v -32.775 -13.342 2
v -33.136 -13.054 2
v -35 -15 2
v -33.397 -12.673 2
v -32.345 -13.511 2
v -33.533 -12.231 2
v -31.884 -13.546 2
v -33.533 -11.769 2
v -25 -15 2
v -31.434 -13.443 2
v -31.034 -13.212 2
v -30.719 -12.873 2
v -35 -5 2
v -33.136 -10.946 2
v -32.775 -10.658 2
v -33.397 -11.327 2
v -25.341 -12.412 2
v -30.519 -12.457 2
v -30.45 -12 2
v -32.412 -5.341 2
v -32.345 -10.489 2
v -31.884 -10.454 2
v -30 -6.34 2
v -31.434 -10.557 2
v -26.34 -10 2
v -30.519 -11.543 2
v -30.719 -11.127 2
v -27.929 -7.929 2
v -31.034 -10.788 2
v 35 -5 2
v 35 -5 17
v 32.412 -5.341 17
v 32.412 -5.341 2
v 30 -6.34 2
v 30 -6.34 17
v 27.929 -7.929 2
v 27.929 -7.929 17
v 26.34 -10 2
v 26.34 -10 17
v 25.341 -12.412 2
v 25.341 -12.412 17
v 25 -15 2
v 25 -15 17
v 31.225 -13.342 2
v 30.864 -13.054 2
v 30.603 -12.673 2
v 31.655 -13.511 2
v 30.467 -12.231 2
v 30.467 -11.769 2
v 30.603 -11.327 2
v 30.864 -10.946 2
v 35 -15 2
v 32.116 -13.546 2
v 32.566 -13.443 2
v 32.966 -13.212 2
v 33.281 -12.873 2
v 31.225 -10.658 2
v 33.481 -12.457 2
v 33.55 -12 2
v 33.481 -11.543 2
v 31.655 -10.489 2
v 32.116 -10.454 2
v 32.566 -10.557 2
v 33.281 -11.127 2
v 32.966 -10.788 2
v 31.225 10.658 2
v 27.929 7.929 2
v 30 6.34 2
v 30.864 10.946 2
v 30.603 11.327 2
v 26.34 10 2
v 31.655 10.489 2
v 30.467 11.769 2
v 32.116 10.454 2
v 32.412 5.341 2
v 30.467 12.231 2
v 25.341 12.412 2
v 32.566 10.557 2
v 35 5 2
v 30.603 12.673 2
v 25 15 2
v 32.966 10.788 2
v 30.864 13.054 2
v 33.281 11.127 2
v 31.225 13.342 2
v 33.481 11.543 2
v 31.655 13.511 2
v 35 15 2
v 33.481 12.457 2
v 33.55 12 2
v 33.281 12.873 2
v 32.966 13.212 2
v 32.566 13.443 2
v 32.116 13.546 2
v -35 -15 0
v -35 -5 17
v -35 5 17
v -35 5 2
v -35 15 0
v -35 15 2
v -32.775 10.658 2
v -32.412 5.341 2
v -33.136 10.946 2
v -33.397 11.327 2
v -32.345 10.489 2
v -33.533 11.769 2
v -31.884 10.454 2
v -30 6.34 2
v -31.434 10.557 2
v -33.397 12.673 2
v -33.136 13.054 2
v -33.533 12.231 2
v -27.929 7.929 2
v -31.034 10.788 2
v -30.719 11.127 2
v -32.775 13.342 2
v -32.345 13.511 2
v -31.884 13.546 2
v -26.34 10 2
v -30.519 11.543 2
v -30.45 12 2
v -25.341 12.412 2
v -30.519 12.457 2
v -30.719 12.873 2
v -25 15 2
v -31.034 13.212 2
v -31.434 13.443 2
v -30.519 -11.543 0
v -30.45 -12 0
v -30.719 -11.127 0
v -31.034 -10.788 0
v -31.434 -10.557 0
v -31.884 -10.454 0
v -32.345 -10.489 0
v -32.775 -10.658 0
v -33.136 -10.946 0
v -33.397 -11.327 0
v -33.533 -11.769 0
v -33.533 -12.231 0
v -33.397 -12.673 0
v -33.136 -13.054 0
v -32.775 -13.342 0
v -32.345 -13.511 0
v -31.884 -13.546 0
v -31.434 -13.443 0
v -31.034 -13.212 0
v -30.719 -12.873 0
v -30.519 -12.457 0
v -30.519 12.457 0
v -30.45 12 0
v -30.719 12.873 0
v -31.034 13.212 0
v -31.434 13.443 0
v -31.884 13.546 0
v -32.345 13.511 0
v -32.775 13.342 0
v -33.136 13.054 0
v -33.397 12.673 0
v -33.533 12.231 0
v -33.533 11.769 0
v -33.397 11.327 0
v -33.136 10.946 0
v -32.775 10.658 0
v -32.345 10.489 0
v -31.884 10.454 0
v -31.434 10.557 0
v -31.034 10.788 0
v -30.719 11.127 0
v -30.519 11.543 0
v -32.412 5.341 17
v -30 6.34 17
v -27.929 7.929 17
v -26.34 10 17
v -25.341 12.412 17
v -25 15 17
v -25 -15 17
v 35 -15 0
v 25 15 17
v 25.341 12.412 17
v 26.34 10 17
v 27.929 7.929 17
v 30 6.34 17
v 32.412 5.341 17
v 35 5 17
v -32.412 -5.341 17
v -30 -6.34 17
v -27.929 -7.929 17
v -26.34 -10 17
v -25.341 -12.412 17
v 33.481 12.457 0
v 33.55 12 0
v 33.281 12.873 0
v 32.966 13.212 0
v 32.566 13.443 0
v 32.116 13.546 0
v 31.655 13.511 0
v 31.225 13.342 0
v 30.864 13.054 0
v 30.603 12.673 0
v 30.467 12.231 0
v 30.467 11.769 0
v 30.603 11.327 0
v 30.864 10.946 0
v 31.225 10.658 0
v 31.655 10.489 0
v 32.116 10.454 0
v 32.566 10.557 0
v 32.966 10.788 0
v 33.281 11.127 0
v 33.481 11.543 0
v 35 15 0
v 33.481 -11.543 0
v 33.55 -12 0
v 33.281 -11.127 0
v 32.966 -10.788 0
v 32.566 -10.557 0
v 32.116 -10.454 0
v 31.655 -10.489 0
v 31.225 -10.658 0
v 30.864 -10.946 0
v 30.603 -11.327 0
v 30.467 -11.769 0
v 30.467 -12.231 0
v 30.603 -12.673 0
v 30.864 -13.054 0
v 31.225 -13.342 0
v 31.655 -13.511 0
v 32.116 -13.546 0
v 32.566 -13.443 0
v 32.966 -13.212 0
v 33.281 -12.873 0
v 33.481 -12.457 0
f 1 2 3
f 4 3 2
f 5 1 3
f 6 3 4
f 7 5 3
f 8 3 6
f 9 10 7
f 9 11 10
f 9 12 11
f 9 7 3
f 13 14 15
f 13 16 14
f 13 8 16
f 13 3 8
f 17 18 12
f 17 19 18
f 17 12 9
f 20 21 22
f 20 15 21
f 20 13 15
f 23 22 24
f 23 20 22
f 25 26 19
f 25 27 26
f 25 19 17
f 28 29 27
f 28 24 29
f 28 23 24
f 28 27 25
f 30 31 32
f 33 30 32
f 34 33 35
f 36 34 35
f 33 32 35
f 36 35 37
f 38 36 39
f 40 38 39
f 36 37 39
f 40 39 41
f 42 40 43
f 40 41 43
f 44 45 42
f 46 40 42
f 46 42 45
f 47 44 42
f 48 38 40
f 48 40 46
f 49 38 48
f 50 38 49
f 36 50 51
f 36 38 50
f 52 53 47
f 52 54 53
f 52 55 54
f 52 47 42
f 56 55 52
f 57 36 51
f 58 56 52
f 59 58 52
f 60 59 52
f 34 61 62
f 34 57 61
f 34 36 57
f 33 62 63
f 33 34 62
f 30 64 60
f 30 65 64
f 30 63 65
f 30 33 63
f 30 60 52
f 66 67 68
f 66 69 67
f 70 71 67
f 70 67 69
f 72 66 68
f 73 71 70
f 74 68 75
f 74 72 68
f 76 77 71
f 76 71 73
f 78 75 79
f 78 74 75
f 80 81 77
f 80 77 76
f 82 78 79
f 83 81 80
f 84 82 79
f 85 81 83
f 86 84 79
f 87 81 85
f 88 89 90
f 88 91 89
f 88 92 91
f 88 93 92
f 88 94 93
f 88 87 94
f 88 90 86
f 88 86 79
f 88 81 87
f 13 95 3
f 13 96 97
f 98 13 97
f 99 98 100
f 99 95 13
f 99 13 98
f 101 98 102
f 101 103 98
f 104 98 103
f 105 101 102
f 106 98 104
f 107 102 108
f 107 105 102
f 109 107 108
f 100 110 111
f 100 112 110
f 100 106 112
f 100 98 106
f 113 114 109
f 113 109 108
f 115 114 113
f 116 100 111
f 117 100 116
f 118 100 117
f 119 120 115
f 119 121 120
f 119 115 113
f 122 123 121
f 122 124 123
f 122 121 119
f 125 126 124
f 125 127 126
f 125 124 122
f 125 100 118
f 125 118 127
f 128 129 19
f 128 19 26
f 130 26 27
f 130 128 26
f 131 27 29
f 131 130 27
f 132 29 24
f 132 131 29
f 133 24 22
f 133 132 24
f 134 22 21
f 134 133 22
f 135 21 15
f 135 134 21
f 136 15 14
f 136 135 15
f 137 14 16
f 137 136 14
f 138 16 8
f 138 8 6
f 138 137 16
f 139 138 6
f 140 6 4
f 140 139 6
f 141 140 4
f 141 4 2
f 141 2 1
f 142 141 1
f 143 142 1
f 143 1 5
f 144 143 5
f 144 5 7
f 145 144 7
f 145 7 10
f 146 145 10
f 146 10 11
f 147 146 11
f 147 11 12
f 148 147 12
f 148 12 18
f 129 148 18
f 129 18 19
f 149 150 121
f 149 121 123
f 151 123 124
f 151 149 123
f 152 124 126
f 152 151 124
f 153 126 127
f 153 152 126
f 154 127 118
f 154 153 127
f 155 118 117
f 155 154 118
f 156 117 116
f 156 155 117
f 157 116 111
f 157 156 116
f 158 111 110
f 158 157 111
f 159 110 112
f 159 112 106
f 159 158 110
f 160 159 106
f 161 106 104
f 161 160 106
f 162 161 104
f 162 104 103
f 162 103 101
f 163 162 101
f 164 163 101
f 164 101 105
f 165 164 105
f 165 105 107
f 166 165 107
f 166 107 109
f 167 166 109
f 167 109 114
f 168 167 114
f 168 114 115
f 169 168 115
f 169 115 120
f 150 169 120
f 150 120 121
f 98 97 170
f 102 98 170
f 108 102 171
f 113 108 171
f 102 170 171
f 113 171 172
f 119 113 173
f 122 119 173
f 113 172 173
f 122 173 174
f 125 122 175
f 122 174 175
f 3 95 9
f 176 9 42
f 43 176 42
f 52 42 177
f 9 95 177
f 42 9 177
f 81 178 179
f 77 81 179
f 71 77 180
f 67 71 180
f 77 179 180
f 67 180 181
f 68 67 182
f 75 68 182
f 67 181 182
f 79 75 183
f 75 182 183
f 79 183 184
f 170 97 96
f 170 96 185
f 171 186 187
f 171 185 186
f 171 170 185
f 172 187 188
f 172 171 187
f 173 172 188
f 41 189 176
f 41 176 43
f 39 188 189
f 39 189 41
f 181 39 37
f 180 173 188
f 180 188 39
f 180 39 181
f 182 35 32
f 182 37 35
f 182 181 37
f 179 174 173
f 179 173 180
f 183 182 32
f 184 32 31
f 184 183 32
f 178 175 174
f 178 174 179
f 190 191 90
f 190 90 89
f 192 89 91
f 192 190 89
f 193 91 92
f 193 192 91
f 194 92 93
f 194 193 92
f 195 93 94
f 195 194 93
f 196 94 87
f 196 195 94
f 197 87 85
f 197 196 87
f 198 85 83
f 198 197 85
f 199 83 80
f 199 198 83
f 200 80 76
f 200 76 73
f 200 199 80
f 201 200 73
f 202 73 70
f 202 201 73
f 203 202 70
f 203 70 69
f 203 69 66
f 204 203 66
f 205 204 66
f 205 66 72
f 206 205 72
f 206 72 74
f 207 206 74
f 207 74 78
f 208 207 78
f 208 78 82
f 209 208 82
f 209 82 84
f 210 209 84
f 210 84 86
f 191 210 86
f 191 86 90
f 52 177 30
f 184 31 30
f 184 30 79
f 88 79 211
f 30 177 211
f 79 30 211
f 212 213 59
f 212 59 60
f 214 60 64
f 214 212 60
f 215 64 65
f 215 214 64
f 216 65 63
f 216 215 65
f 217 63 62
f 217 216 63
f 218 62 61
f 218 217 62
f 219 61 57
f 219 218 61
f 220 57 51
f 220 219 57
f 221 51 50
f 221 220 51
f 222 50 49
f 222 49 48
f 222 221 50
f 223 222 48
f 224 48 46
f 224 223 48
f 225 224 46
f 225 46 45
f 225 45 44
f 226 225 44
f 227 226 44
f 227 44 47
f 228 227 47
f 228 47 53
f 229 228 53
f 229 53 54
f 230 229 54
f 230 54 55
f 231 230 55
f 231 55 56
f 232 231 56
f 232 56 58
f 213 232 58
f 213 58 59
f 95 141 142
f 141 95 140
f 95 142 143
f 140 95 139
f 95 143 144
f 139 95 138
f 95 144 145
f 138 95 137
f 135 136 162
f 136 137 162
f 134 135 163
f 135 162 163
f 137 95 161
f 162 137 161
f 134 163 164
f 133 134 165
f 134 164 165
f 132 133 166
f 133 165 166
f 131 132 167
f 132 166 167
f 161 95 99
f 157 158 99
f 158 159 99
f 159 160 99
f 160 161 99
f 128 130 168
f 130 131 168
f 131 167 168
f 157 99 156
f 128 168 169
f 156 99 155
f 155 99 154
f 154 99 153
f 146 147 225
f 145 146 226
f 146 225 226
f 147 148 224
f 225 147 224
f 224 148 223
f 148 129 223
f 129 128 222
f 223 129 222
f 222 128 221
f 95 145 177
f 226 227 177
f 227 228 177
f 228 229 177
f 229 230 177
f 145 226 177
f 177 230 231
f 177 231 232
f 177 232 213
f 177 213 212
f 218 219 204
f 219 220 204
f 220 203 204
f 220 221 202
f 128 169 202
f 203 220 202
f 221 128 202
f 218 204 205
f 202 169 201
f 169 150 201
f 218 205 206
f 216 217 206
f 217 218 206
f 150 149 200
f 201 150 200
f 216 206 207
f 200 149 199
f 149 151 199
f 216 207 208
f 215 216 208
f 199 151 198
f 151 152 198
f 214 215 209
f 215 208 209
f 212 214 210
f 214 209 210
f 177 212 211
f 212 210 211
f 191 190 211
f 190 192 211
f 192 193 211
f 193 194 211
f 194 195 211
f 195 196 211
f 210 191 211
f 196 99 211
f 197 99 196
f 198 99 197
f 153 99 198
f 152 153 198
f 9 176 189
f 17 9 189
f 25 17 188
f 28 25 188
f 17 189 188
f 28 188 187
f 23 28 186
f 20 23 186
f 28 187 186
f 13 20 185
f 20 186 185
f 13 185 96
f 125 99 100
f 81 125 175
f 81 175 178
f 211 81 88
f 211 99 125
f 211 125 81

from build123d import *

# Parameters (mm, degrees)
SKETCH1_W           = 70
SKETCH1_H           = 30
SKETCH1_R           = 1.55
BOSS_EXTRUDE1_DEPTH = 17
SKETCH2_R           = 1.55
CUT_EXTRUDE1_DEPTH  = 15


with BuildPart() as part:
    # Sketch1 → Boss-Extrude1 (new body)
    with BuildSketch(Plane.XY):
        Rectangle(SKETCH1_W, SKETCH1_H)
        with Locations((-32, 12)):
            Circle(SKETCH1_R, mode=Mode.SUBTRACT)
        with Locations((32, 12)):
            Circle(SKETCH1_R, mode=Mode.SUBTRACT)
        with Locations((32, -12)):
            Circle(SKETCH1_R, mode=Mode.SUBTRACT)
        with Locations((-32, -12)):
            Circle(SKETCH1_R, mode=Mode.SUBTRACT)
    extrude(amount=BOSS_EXTRUDE1_DEPTH)

    # Sketch2 → Cut-Extrude1 (cut)
    with BuildSketch(Plane.XY.offset(17)):
        with BuildLine():
            Line((-35, 15), (-35, 5))
            ThreePointArc((-35, 5), (-27.928932188, 7.928932188), (-25, 15))
            Line((-25, 15), (-35, 15))
        make_face()
        with Locations((-32, 12)):
            Circle(SKETCH2_R, mode=Mode.SUBTRACT)
        with BuildLine():
            Line((35, 15), (25, 15))
            ThreePointArc((25, 15), (27.928932188, 7.928932188), (35, 5))
            Line((35, 5), (35, 15))
        make_face()
        with Locations((32, 12)):
            Circle(SKETCH2_R, mode=Mode.SUBTRACT)
        with BuildLine():
            ThreePointArc((35, -5), (27.928932188, -7.928932188), (25, -15))
            Line((25, -15), (35, -15))
            Line((35, -15), (35, -5))
        make_face()
        with Locations((32, -12)):
            Circle(SKETCH2_R, mode=Mode.SUBTRACT)
        with BuildLine():
            ThreePointArc((-25, -15), (-27.928932188, -7.928932188), (-35, -5))
            Line((-35, -5), (-35, -15))
            Line((-35, -15), (-25, -15))
        make_face()
        with Locations((-32, -12)):
            Circle(SKETCH2_R, mode=Mode.SUBTRACT)
    extrude(amount=-CUT_EXTRUDE1_DEPTH, mode=Mode.SUBTRACT)


solid = part.part
